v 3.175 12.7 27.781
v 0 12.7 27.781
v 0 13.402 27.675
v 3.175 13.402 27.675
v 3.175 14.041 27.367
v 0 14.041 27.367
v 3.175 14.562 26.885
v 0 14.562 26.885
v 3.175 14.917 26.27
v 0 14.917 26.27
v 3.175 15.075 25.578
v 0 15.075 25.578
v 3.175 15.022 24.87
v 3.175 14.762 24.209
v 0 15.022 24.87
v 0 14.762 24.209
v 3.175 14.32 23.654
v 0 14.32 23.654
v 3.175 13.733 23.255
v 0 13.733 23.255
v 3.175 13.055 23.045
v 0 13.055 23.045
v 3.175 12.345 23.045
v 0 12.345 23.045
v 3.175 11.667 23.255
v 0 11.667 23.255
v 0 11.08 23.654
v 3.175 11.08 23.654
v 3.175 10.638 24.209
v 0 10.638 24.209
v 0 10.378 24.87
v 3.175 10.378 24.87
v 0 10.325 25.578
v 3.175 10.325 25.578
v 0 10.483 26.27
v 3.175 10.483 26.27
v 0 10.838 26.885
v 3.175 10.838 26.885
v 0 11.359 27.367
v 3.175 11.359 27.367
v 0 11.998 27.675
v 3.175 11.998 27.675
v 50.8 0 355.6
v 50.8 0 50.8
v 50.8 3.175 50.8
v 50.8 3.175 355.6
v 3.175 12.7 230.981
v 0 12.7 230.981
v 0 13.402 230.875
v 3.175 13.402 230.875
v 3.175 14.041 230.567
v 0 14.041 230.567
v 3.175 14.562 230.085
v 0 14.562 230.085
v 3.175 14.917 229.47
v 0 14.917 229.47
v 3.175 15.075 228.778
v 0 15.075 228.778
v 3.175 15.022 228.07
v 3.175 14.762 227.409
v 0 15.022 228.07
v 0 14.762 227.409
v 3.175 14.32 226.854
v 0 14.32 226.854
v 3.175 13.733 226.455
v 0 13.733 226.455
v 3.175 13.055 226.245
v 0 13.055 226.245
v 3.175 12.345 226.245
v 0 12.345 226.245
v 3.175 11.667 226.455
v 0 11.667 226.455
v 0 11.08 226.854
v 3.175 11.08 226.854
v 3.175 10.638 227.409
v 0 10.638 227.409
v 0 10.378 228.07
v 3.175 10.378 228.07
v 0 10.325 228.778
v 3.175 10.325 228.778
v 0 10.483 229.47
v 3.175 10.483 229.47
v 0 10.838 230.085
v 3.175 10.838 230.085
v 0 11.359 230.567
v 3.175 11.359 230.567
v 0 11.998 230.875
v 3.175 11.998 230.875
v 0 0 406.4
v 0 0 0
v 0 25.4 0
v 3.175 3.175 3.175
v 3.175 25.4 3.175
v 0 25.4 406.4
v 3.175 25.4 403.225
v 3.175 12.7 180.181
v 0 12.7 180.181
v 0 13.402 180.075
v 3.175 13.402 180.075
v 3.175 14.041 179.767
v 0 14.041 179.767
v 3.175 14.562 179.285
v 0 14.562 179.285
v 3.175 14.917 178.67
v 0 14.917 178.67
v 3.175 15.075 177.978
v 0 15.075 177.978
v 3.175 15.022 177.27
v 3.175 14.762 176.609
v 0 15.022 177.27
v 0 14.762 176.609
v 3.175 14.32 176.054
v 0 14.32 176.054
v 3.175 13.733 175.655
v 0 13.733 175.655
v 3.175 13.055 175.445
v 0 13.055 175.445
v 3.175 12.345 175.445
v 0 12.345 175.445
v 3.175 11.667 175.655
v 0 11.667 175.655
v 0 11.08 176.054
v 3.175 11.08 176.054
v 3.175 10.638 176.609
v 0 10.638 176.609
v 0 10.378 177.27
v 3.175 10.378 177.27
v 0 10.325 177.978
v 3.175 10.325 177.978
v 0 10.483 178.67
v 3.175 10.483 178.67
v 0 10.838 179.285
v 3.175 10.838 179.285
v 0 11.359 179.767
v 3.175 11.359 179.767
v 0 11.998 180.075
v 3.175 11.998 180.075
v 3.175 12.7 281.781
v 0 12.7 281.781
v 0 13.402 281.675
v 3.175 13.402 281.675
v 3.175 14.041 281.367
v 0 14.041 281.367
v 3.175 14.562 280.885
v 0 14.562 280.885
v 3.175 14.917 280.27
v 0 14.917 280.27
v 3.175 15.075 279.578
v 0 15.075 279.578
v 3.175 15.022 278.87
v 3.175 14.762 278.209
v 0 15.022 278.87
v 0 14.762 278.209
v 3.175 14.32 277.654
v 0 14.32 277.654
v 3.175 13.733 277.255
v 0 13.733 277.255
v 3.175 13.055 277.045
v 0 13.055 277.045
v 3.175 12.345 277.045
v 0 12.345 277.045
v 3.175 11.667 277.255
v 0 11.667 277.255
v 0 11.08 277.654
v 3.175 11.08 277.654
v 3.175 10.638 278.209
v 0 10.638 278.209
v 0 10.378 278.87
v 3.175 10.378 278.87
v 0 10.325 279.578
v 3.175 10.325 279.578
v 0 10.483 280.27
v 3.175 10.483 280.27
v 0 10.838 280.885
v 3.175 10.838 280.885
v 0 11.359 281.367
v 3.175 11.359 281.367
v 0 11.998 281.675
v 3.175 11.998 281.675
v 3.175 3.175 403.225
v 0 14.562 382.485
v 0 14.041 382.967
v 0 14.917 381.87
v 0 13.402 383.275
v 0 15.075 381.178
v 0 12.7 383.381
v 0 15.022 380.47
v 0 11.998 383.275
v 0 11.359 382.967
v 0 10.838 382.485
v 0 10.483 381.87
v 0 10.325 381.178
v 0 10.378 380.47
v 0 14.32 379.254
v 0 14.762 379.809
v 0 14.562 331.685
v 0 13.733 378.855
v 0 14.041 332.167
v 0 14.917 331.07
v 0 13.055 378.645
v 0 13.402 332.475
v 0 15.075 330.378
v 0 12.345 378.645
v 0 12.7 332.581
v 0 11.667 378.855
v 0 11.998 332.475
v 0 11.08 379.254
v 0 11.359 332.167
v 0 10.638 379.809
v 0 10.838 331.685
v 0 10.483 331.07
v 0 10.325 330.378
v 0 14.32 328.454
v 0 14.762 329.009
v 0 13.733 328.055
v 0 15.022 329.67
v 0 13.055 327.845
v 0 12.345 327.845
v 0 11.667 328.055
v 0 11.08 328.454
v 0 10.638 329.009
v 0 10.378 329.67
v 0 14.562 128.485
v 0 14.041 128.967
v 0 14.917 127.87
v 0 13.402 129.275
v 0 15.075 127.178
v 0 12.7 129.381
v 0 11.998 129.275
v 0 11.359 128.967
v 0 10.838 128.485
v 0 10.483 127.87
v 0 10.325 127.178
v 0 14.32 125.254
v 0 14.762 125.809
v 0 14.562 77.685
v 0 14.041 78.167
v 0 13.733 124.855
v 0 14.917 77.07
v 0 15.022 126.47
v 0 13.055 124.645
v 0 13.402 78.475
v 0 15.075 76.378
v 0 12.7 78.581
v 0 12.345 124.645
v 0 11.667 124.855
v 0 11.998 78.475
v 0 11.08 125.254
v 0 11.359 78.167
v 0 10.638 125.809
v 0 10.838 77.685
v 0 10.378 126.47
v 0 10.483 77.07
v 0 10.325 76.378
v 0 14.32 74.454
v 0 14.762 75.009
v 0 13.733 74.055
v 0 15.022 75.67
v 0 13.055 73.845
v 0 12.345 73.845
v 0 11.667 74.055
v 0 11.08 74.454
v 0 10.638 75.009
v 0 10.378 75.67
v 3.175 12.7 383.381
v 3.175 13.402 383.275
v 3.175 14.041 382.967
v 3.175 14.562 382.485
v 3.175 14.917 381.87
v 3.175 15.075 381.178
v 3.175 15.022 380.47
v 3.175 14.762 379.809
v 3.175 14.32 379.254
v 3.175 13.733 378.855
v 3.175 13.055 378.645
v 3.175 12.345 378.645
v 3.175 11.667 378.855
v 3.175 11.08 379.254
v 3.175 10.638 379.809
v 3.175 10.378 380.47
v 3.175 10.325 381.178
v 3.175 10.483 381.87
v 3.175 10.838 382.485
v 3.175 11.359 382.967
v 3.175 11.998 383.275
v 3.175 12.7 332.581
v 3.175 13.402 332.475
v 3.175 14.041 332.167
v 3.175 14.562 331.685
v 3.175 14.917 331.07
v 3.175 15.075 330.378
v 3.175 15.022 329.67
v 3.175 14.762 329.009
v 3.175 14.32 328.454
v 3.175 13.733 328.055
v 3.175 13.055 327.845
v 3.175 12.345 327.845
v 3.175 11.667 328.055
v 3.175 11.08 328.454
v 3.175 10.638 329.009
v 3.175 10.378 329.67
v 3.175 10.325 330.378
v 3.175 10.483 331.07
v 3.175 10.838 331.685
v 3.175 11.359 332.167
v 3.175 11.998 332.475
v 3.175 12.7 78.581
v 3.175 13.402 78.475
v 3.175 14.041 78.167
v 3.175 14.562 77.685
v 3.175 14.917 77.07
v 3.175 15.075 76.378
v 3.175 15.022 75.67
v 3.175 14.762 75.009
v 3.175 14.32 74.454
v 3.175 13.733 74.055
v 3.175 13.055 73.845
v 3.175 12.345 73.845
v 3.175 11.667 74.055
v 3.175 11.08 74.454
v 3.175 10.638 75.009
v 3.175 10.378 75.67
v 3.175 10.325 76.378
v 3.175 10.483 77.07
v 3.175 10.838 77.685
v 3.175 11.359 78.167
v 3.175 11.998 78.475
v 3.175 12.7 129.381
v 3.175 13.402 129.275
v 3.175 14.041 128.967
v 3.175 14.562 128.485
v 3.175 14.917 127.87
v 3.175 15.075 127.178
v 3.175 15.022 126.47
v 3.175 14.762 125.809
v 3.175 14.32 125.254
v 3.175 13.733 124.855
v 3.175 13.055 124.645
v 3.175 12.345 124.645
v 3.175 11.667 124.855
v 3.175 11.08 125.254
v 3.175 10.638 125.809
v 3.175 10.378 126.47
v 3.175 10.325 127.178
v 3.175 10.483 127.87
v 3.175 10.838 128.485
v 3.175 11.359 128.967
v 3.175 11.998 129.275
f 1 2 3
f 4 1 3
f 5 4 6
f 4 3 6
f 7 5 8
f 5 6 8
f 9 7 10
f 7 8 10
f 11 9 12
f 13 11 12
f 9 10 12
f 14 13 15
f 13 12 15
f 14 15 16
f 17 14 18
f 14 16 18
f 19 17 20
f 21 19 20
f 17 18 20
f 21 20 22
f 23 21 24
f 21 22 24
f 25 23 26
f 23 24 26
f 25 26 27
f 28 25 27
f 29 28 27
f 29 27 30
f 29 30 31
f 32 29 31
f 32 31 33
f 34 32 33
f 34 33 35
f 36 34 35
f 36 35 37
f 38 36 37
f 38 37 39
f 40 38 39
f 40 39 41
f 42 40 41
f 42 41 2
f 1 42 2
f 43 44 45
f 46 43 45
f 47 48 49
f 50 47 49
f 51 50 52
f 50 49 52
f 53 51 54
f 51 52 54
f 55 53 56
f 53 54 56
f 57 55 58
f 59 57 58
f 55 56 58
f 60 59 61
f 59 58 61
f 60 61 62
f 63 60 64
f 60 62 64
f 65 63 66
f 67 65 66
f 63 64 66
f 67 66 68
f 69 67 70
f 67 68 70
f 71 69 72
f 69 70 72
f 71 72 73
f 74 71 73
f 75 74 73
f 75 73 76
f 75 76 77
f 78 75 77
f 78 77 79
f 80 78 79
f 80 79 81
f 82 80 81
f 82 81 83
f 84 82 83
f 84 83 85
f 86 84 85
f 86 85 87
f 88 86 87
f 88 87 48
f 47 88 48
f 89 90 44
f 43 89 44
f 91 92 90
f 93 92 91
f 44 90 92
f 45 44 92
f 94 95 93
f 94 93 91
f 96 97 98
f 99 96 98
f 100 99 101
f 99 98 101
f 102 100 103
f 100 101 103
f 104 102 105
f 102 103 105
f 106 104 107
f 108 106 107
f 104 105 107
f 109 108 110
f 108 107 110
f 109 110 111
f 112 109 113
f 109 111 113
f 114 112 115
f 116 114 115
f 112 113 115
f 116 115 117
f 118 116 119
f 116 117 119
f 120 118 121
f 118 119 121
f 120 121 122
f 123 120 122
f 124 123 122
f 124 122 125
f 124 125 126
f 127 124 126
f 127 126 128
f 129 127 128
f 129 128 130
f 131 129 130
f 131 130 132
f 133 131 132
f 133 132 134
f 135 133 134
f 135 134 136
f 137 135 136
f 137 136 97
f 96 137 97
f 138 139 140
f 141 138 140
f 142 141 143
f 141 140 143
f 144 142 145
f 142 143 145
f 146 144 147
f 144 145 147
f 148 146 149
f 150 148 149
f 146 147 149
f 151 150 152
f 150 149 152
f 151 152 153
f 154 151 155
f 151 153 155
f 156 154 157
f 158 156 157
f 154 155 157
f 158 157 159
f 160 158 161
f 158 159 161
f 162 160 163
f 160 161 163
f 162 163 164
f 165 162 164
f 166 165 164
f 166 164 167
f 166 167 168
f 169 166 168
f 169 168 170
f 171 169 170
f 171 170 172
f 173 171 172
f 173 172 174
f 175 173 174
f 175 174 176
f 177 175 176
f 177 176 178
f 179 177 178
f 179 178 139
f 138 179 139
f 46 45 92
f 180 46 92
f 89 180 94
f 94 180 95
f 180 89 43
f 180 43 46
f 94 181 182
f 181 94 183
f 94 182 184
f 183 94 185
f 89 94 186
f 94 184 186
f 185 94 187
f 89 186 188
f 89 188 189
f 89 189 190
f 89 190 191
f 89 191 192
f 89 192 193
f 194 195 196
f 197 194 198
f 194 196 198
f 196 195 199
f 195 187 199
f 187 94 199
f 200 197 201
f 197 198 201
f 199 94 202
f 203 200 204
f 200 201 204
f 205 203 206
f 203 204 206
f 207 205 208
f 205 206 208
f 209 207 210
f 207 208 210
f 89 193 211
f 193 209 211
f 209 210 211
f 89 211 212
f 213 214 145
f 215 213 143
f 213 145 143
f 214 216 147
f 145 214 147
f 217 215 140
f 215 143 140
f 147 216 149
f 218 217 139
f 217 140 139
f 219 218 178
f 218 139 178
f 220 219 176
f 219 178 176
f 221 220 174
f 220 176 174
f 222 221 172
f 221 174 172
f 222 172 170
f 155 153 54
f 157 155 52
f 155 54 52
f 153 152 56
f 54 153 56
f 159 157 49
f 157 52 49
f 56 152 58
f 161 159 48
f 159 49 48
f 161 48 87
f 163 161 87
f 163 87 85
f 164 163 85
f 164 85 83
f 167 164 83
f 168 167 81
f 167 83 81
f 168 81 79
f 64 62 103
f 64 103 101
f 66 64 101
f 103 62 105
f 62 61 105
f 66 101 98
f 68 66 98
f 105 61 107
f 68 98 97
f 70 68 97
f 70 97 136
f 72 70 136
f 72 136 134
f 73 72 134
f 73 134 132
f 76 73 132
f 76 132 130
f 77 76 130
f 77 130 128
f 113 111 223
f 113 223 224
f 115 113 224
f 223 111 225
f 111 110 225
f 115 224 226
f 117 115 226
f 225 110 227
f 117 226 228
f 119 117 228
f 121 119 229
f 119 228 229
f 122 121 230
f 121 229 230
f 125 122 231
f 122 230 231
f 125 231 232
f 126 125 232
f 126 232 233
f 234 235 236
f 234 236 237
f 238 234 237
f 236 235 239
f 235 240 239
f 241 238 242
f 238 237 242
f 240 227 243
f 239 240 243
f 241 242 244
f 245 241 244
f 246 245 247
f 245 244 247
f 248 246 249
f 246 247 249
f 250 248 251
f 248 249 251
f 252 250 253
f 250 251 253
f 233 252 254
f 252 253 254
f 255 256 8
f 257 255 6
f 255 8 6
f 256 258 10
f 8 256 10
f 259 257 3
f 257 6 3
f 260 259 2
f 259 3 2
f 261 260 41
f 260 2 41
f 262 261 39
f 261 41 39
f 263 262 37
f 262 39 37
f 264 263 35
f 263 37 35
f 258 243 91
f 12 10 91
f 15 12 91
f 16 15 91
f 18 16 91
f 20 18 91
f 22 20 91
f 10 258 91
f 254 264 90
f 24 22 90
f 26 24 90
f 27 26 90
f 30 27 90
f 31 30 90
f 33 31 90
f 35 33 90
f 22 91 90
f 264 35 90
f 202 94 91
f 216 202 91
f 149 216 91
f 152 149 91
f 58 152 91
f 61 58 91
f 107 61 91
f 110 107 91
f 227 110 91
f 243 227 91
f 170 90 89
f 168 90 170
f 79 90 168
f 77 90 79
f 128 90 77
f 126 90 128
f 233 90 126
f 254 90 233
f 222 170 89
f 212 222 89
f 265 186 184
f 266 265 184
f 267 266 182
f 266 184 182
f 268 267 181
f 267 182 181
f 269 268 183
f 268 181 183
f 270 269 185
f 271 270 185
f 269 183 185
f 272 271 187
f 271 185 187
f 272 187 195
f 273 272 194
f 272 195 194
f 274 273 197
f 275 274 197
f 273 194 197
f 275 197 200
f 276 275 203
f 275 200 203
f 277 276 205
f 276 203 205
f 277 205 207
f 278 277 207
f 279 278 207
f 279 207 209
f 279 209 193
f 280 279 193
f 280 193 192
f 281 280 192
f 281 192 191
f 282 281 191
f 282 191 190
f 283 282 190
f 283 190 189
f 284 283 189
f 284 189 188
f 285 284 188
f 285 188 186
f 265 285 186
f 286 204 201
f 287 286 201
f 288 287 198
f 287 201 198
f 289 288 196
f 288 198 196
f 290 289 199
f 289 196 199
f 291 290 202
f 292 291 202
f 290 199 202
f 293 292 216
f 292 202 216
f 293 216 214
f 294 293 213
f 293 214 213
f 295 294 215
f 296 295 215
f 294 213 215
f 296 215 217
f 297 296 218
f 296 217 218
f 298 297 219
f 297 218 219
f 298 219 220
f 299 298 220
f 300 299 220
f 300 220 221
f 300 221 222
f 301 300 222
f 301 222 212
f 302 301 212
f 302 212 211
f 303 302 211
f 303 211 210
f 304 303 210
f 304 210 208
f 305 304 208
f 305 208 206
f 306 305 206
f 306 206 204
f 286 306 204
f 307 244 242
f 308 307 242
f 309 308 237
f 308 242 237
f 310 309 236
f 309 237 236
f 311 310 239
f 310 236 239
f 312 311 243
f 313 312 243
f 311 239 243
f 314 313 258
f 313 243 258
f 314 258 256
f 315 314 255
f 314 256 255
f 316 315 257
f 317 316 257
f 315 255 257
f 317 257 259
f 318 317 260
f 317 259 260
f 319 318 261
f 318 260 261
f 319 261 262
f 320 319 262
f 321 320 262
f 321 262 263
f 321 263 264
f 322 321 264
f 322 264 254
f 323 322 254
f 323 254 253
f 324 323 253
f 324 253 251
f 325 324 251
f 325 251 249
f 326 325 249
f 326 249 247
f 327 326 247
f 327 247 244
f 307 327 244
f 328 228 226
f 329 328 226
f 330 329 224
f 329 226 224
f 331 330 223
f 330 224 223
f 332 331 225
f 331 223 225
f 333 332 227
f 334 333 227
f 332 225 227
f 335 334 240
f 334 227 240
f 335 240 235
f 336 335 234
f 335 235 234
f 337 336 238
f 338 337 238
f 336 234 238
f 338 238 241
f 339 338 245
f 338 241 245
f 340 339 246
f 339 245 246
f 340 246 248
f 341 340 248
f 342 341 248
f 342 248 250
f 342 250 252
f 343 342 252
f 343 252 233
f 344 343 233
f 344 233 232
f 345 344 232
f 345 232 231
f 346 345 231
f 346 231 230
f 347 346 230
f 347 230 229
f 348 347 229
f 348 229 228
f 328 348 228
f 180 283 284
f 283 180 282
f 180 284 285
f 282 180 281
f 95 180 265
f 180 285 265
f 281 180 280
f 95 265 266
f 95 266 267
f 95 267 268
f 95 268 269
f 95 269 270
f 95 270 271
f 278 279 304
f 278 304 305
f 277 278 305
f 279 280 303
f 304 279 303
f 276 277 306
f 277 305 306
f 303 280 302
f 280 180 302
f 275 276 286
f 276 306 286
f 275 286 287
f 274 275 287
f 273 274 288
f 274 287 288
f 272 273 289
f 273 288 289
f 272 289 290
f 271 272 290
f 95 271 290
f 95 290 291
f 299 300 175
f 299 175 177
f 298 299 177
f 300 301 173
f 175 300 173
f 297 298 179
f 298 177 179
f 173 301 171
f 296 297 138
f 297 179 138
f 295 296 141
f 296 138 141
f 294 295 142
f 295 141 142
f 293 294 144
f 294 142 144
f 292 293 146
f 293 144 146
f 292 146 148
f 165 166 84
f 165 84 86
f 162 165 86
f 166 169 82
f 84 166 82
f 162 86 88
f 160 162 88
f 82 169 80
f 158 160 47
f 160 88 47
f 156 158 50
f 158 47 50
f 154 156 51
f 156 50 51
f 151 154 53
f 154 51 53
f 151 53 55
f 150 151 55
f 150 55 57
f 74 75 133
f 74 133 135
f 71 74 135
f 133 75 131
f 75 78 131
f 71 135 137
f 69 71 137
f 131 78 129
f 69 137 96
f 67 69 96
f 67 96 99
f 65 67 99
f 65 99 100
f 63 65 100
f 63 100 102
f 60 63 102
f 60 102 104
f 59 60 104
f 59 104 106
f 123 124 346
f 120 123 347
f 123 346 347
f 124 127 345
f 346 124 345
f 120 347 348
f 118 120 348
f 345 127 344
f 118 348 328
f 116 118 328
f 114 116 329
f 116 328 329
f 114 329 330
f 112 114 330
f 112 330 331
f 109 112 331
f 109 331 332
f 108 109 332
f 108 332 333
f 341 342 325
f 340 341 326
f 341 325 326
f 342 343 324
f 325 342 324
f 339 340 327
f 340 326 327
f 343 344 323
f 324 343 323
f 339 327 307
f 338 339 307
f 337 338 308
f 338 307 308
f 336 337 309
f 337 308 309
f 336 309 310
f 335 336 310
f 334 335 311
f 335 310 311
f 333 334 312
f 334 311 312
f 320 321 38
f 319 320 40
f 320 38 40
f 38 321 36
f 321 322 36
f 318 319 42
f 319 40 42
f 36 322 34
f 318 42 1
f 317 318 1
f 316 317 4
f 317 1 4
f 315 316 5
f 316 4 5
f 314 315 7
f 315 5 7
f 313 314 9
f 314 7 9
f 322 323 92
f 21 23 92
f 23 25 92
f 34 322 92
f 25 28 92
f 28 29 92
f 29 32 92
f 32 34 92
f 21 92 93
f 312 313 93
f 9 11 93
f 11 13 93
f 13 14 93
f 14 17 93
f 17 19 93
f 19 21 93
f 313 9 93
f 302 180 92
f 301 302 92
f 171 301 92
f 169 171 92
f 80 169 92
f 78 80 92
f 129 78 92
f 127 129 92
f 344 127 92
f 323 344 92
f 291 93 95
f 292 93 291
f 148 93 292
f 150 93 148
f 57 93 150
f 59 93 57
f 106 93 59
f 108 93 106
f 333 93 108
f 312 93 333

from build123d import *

# Parameters (mm, degrees)
BOSS_EXTRUDE1_DEPTH = 406.4
SKETCH2_R           = 2.38125
CUT_EXTRUDE1_DEPTH  = 411.349558304
CHAMFER1_SIZE       = 50.8
CHAMFER2_SIZE       = 50.8


with BuildPart() as part:
    # Sketch1 → Boss-Extrude1 (new body)
    with BuildSketch(Plane.XY):
        Polygon((0, 25.4), (0, 0), (50.8, 0), (50.8, 3.175), (3.175, 3.175), (3.175, 25.4), align=None)
    extrude(amount=BOSS_EXTRUDE1_DEPTH)

    # Sketch2 → Cut-Extrude1 (cut, through all)
    with BuildSketch(Plane.ZY):
        with Locations((381, 12.7)):
            Circle(SKETCH2_R)
        with Locations((330.2, 12.7)):
            Circle(SKETCH2_R)
        with Locations((279.4, 12.7)):
            Circle(SKETCH2_R)
        with Locations((228.6, 12.7)):
            Circle(SKETCH2_R)
        with Locations((177.8, 12.7)):
            Circle(SKETCH2_R)
        with Locations((127, 12.7)):
            Circle(SKETCH2_R)
        with Locations((76.2, 12.7)):
            Circle(SKETCH2_R)
        with Locations((25.4, 12.7)):
            Circle(SKETCH2_R)
        with Locations((-25.4, 12.7)):
            Circle(SKETCH2_R)
        with Locations((-76.2, 12.7)):
            Circle(SKETCH2_R)
    extrude(amount=-CUT_EXTRUDE1_DEPTH, mode=Mode.SUBTRACT)

    # Chamfer1
    chamfer1_edges = [part.edges().sort_by_distance(p)[0] for p in [
        (50.8, 1.5875, 406.4),
    ]]
    chamfer(chamfer1_edges, length=CHAMFER1_SIZE - 0.0001)  # a hair under: the kernel refuses the full size

    # Chamfer2
    chamfer2_edges = [part.edges().sort_by_distance(p)[0] for p in [
        (50.8, 1.5875, 0),
    ]]
    chamfer(chamfer2_edges, length=CHAMFER2_SIZE - 0.0001)  # a hair under: the kernel refuses the full size


solid = part.part
